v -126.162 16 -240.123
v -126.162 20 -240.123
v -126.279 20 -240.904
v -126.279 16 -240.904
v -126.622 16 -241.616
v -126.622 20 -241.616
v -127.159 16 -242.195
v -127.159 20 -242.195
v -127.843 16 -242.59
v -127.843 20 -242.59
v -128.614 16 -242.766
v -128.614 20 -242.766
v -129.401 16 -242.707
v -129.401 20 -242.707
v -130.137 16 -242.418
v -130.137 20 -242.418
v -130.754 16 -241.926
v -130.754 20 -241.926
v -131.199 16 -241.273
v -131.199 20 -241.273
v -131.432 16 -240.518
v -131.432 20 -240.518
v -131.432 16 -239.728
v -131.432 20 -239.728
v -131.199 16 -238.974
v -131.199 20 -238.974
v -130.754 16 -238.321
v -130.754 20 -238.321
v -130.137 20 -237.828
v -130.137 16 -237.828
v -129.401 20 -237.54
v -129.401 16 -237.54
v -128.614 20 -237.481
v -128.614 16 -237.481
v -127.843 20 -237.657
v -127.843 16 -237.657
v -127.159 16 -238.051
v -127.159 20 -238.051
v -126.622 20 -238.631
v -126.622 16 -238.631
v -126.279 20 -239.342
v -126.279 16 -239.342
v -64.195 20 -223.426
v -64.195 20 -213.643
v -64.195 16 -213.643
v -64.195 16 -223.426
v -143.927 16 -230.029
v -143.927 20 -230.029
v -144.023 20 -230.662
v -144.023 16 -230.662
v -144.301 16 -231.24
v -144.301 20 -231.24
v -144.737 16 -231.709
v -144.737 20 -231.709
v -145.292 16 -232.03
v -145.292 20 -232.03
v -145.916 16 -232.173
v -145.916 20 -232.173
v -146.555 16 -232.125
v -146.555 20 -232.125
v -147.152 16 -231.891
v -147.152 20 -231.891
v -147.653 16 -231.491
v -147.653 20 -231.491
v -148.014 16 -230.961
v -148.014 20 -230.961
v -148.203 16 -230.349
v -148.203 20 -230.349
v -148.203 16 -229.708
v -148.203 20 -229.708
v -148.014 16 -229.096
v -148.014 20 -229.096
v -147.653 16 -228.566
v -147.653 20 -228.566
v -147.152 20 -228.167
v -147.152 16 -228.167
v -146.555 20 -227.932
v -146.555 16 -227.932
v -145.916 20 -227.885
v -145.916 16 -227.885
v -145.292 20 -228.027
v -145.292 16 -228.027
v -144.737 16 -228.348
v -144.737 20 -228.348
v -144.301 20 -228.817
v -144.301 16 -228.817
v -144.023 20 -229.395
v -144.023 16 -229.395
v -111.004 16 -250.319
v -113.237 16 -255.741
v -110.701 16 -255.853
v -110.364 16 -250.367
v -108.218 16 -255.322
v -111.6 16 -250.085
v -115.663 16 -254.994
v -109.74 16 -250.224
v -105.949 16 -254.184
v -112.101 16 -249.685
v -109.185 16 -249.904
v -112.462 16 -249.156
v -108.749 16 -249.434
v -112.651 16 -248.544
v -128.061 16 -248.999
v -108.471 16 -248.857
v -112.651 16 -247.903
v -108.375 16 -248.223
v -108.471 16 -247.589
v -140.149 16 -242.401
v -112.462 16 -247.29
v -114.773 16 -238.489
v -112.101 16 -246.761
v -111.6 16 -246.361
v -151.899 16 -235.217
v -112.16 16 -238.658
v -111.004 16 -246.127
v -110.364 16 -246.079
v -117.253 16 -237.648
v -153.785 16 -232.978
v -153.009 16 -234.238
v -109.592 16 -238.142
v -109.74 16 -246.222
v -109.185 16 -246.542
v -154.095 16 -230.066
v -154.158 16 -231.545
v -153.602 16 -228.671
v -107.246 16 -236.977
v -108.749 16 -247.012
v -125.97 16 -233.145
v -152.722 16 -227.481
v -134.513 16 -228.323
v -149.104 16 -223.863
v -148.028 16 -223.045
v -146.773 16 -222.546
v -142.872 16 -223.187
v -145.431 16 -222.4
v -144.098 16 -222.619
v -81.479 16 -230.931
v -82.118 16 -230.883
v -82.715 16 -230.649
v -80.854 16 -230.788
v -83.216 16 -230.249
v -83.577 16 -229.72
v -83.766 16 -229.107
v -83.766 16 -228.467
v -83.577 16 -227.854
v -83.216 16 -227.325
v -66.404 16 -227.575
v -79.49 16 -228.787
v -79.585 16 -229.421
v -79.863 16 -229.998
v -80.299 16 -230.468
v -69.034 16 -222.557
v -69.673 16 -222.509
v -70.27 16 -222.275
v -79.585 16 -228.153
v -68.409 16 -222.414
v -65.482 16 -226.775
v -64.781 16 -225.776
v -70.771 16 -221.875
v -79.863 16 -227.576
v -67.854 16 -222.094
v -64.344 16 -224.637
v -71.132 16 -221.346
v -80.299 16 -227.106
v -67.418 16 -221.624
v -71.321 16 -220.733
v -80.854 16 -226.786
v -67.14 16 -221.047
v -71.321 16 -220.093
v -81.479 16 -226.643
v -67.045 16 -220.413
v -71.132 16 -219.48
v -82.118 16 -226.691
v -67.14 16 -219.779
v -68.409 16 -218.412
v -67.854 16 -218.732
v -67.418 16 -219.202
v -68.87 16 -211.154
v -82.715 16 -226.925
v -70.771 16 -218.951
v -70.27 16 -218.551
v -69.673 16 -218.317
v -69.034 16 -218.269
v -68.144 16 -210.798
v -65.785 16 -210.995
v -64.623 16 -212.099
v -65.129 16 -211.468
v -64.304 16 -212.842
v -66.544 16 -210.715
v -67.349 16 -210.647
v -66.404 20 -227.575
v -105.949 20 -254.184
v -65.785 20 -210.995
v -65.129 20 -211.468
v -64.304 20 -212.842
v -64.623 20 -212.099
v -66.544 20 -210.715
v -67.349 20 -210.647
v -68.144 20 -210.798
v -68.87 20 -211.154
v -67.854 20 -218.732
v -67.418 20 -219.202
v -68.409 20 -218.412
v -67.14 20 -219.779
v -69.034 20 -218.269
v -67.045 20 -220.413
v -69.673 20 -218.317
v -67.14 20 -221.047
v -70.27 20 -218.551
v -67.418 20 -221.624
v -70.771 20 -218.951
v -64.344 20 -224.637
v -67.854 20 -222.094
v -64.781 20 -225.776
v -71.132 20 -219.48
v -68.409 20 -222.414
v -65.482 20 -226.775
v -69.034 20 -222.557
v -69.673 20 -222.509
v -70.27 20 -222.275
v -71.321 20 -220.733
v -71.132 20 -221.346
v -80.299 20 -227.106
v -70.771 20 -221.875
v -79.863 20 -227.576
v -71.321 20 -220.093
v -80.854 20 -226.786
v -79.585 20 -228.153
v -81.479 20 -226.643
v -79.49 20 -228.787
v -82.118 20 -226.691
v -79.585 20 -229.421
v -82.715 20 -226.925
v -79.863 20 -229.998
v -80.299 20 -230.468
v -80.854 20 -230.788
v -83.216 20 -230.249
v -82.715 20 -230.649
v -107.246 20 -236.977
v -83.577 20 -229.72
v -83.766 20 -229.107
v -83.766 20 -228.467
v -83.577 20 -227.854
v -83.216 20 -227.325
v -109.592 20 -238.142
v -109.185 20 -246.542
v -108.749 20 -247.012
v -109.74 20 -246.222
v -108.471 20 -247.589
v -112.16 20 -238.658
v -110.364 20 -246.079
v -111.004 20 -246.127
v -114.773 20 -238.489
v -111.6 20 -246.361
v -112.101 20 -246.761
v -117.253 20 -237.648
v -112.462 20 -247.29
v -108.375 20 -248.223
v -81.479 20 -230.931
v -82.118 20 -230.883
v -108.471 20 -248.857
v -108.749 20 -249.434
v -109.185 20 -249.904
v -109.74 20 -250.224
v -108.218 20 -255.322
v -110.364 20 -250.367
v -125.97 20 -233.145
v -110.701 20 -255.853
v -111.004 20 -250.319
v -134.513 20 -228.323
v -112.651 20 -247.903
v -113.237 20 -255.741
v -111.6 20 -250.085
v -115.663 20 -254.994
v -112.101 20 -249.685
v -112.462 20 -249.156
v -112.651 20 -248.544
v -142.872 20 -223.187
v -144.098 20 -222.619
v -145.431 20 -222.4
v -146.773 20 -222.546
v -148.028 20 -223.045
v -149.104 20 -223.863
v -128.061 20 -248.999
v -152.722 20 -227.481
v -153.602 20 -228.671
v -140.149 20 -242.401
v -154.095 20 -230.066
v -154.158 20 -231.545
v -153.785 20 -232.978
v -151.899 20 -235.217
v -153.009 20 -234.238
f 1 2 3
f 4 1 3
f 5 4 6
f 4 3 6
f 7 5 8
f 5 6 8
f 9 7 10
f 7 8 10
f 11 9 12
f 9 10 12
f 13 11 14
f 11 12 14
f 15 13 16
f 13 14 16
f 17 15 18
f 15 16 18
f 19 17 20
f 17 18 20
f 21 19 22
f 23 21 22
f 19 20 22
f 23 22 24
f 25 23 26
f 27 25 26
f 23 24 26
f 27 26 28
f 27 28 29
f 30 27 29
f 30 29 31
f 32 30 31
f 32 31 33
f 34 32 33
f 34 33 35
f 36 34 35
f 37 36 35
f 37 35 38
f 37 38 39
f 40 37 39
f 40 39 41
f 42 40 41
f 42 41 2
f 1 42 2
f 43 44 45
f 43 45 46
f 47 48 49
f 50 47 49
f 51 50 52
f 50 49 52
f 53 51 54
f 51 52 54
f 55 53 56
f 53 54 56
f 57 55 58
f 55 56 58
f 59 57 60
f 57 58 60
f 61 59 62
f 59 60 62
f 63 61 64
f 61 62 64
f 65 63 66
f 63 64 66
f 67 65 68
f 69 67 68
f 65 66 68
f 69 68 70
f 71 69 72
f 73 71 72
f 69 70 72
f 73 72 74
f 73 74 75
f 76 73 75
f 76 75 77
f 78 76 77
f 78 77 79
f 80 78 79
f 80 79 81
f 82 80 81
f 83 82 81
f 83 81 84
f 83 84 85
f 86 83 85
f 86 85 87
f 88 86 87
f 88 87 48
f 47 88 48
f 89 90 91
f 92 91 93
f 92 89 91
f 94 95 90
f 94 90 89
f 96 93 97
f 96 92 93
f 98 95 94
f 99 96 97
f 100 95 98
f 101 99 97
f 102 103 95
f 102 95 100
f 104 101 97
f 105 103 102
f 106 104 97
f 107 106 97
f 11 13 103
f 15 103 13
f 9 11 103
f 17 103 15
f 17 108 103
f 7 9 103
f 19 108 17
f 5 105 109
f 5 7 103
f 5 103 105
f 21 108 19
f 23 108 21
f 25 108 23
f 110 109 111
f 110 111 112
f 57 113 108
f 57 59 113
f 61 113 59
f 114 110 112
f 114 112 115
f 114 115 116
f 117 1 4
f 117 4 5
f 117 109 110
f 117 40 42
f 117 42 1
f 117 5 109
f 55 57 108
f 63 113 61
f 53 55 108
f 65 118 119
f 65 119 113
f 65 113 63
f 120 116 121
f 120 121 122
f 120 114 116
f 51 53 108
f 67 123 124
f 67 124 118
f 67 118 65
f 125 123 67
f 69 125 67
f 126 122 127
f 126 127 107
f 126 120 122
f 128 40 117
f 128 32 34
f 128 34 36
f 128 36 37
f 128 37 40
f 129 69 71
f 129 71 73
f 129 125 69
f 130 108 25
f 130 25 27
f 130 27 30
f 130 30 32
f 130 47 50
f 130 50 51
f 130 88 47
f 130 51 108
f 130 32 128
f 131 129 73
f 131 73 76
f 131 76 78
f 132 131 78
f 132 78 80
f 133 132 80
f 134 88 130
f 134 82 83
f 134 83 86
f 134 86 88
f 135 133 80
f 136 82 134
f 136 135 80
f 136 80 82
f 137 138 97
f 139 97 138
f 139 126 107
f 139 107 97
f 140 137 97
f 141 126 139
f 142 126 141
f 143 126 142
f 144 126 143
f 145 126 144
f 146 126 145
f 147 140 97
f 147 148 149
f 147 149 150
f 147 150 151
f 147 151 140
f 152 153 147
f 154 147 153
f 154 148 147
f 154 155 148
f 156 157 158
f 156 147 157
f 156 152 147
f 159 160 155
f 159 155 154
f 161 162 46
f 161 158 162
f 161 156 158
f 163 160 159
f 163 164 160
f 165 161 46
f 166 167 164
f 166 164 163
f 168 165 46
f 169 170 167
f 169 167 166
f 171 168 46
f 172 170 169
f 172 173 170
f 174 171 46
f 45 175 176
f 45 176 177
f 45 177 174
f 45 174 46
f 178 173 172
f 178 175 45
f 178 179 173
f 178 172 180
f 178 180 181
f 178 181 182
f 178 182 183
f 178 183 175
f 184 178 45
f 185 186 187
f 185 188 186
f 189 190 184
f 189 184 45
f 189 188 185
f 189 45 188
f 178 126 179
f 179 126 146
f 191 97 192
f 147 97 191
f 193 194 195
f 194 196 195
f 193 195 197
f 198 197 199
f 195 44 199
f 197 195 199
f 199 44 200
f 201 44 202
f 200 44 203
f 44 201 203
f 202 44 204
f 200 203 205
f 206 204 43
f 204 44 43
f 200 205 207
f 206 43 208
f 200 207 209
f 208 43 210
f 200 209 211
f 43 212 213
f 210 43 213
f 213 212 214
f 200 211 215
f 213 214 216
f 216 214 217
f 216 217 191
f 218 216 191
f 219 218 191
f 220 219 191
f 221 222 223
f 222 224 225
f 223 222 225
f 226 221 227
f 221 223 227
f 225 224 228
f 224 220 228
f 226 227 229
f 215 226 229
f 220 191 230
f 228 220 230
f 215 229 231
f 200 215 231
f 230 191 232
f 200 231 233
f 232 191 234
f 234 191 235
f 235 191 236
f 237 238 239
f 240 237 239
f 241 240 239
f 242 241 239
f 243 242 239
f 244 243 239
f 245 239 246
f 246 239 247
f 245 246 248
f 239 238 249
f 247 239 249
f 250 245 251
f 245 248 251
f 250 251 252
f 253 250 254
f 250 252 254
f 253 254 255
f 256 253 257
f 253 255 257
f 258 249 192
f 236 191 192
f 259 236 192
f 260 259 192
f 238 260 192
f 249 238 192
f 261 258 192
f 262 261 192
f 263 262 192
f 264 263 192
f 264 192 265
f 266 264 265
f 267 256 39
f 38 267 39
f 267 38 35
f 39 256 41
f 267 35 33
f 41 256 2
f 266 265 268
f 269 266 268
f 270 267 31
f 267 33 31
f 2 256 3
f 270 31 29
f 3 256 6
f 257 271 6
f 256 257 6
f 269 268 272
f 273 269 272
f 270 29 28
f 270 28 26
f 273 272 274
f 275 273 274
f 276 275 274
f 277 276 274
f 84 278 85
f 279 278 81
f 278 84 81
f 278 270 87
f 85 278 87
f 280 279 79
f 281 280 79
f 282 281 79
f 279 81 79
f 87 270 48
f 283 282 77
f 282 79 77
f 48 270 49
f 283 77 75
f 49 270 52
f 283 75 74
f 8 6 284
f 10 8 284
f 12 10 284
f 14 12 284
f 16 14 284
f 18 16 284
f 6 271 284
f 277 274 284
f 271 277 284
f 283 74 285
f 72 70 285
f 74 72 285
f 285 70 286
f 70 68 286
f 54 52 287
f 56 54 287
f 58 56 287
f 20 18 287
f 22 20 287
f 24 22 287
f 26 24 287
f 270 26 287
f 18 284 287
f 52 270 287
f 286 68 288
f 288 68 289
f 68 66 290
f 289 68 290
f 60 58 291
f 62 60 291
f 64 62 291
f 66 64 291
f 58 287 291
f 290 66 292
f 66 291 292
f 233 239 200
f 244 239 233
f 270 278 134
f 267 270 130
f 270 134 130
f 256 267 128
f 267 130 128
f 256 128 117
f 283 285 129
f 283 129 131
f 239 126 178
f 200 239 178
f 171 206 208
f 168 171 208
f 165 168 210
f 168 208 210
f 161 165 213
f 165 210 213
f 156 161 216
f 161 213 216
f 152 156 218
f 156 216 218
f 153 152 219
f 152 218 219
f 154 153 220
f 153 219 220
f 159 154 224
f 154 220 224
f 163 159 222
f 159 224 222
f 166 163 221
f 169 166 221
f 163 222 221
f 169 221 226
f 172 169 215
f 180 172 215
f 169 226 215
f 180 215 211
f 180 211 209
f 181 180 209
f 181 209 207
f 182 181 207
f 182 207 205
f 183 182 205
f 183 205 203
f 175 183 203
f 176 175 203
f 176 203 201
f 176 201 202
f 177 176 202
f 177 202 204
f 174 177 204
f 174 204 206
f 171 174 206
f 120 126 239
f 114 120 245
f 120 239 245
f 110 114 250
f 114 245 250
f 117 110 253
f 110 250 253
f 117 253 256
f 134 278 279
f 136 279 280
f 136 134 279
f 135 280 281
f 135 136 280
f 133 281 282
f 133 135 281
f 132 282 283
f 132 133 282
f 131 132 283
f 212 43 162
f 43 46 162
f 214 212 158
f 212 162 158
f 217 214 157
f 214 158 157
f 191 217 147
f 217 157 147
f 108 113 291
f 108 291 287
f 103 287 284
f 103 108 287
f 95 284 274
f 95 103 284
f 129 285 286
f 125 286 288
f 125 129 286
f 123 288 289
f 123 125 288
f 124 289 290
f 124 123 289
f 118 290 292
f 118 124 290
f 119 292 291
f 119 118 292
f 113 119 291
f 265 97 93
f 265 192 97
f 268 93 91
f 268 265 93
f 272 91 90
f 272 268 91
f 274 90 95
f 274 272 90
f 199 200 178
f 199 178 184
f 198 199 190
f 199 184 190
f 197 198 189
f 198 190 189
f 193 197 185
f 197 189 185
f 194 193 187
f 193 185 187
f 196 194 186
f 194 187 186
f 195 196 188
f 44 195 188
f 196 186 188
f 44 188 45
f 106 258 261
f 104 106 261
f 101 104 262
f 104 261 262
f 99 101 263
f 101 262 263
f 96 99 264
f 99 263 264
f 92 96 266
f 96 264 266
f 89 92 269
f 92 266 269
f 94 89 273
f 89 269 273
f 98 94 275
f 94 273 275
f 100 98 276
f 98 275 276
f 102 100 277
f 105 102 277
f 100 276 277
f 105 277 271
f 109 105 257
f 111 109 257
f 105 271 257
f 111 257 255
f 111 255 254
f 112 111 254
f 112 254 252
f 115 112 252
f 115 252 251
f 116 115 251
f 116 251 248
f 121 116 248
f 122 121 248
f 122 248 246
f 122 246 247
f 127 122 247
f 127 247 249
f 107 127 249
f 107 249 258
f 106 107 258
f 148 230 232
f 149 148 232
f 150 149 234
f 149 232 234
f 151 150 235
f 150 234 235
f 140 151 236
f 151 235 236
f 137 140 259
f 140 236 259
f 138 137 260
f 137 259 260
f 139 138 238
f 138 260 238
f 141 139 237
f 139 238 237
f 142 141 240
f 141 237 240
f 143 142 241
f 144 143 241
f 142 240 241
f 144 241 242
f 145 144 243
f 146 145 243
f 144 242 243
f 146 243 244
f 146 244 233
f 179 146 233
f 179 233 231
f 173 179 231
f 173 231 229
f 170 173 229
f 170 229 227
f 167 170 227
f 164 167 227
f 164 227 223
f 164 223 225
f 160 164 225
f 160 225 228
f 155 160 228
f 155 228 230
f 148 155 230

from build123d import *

# Parameters (mm, degrees)
SKETCH_1_R               = 275
SKETCH_1_R_2             = 255
EXTRUDE_1_DEPTH          = 10
EXTRUDE_2_DEPTH          = 10
SKETCH_8_R               = 2.65
SKETCH_8_R_2             = 2.15
CUT_EXTRUDE_1_DEPTH      = 21
SKETCH_9_OUTSIDE_W       = 707.614
SKETCH_9_OUTSIDE_H       = 707.614
CUT_EXTRUDE_2_DEPTH      = 21
SKETCH_10_W              = 190.987823936
SKETCH_10_H              = 12
CUT_EXTRUDE_3_DEPTH      = 519.420037555
CUT_EXTRUDE_3_DEPTH_BACK = 245.939436413
FILLET_1_R               = 3
FILLET_2_R               = 10
FILLET_3_R               = 5
SKETCH_11_W              = 751.740061758
SKETCH_11_H              = 25.075171634
CUT_EXTRUDE_4_DEPTH      = 519.420037555
CUT_EXTRUDE_4_DEPTH_BACK = 245.939436413


with BuildPart() as part:
    # 草图1 → 凸台-拉伸1 (new body)
    with BuildSketch(Plane(origin=(0, 0, 0), x_dir=(1, 0, 0), z_dir=(0, 1, 0))):
        Circle(SKETCH_1_R)
        Circle(SKETCH_1_R_2, mode=Mode.SUBTRACT)
    extrude(amount=EXTRUDE_1_DEPTH)

    # 草图11 → 切除-拉伸4 (cut, two sides)
    with BuildSketch(Plane(origin=(76.33674701, 0, -113.448714652), x_dir=(0.829665535, 0, 0.558260781), z_dir=(-0.558260781, 0, 0.829665535))) as cut_extrude_4_sk:
        with Locations((71.776229786, 3.462414183)):
            Rectangle(SKETCH_11_W, SKETCH_11_H)
    extrude(amount=CUT_EXTRUDE_4_DEPTH, mode=Mode.SUBTRACT)
    extrude(cut_extrude_4_sk.sketch, amount=-CUT_EXTRUDE_4_DEPTH_BACK, mode=Mode.SUBTRACT)


with BuildPart() as body_2:
    # 草图2 → 凸台-拉伸2 (new body)
    with BuildSketch(Plane(origin=(0, 10, 0), x_dir=(1, 0, 0), z_dir=(0, 1, 0))):
        with BuildLine():
            Line((-110.525139894, 257.262887824), (-25.423255477, 200))
            Line((-25.423255477, 200), (0, 200))
            Line((0, 200), (25.423255477, 200))
            Line((25.423255477, 200), (110.525139894, 257.262887824))
            ThreePointArc((110.525139894, 257.262887824), (197.989898732, 197.989898732), (257.262887824, 110.525139894))
            Line((257.262887824, 110.525139894), (200, 25.423255477))
            Line((200, 25.423255477), (200, 0))
            Line((200, 0), (200, -25.423255477))
            Line((200, -25.423255477), (257.262887824, -110.525139894))
            ThreePointArc((257.262887824, -110.525139894), (197.989898732, -197.989898732), (110.525139894, -257.262887824))
            Line((110.525139894, -257.262887824), (25.423255477, -200))
            Line((25.423255477, -200), (0, -200))
            Line((0, -200), (-25.423255477, -200))
            Line((-25.423255477, -200), (-110.525139894, -257.262887824))
            ThreePointArc((-110.525139894, -257.262887824), (-197.989898732, -197.989898732), (-257.262887824, -110.525139894))
            Line((-257.262887824, -110.525139894), (-200, -25.423255477))
            Line((-200, -25.423255477), (-200, 25.423255477))
            Line((-200, 25.423255477), (-257.262887824, 110.525139894))
            ThreePointArc((-257.262887824, 110.525139894), (-197.989898732, 197.989898732), (-110.525139894, 257.262887824))
        make_face()
        with BuildLine():
            Line((0, 185), (30, 185))
            Line((30, 185), (111.993839361, 240.171563565))
            ThreePointArc((111.993839361, 240.171563565), (187.383297014, 187.383297014), (240.171563565, 111.993839361))
            Line((240.171563565, 111.993839361), (185, 30))
            Line((185, 30), (185, 0))
            Line((185, 0), (185, -30))
            Line((185, -30), (240.171563565, -111.993839361))
            ThreePointArc((240.171563565, -111.993839361), (187.383297014, -187.383297014), (111.993839361, -240.171563565))
            Line((111.993839361, -240.171563565), (30, -185))
            Line((30, -185), (0, -185))
            Line((0, -185), (-30, -185))
            Line((-30, -185), (-111.993839361, -240.171563565))
            ThreePointArc((-111.993839361, -240.171563565), (-187.383297014, -187.383297014), (-240.171563565, -111.993839361))
            Line((-240.171563565, -111.993839361), (-185, -30))
            Line((-185, -30), (-185, 30))
            Line((-185, 30), (-240.171563565, 111.993839361))
            ThreePointArc((-240.171563565, 111.993839361), (-187.383297014, 187.383297014), (-111.993839361, 240.171563565))
            Line((-111.993839361, 240.171563565), (-30, 185))
            Line((-30, 185), (0, 185))
        make_face(mode=Mode.SUBTRACT)
    extrude(amount=EXTRUDE_2_DEPTH)

    # 草图8 → 切除-拉伸1 (cut, through all)
    with BuildSketch(Plane(origin=(0, 20, 0), x_dir=(1, 0, 0), z_dir=(0, 1, 0))):
        with Locations((-10, 192.5)):
            Circle(SKETCH_8_R)
        with Locations((10, 192.5)):
            Circle(SKETCH_8_R)
        with Locations((-10, -192.5)):
            Circle(SKETCH_8_R)
        with Locations((10, -192.5)):
            Circle(SKETCH_8_R)
        with Locations((192.5, 10)):
            Circle(SKETCH_8_R)
        with Locations((192.5, -10)):
            Circle(SKETCH_8_R)
        with Locations((-192.5, 10)):
            Circle(SKETCH_8_R)
        with Locations((-192.5, -10)):
            Circle(SKETCH_8_R)
        with Locations((-110.525139894, 248.223100485)):
            Circle(SKETCH_8_R_2)
        with Locations((-27.711627738, 192.5)):
            Circle(SKETCH_8_R_2)
        with Locations((-44.304938442, 203.665215623)):
            Circle(SKETCH_8_R_2)
        with Locations((-56.749921469, 212.03912734)):
            Circle(SKETCH_8_R_2)
        with Locations((-69.194904497, 220.413039057)):
            Circle(SKETCH_8_R_2)
        with Locations((-81.639887524, 228.786950774)):
            Circle(SKETCH_8_R_2)
        with Locations((-146.077022117, 230.028561882)):
            Circle(SKETCH_8_R_2)
        with Locations((-164.415519771, 217.299729706)):
            Circle(SKETCH_8_R_2)
        with Locations((-183.638937552, 201.316607082)):
            Circle(SKETCH_8_R_2)
        with Locations((-201.316607082, 183.638937552)):
            Circle(SKETCH_8_R_2)
        with Locations((-217.299729706, 164.415519771)):
            Circle(SKETCH_8_R_2)
        with Locations((-230.028561882, 146.077022117)):
            Circle(SKETCH_8_R_2)
        with Locations((-128.811575358, 240.123330241)):
            Circle(SKETCH_8_R)
        with Locations((-240.123330241, 128.811575358)):
            Circle(SKETCH_8_R)
        with Locations((-228.786950774, 81.639887524)):
            Circle(SKETCH_8_R_2)
        with Locations((-220.413039057, 69.194904497)):
            Circle(SKETCH_8_R_2)
        with Locations((-212.03912734, 56.749921469)):
            Circle(SKETCH_8_R_2)
        with Locations((-203.665215623, 44.304938442)):
            Circle(SKETCH_8_R_2)
        with Locations((-192.5, 27.711627738)):
            Circle(SKETCH_8_R_2)
        with Locations((-248.223100485, 110.525139894)):
            Circle(SKETCH_8_R_2)
        with Locations((192.5, 27.711627738)):
            Circle(SKETCH_8_R_2)
        with Locations((248.223100485, 110.525139894)):
            Circle(SKETCH_8_R_2)
        with Locations((203.665215623, 44.304938442)):
            Circle(SKETCH_8_R_2)
        with Locations((212.03912734, 56.749921469)):
            Circle(SKETCH_8_R_2)
        with Locations((220.413039057, 69.194904497)):
            Circle(SKETCH_8_R_2)
        with Locations((228.786950774, 81.639887524)):
            Circle(SKETCH_8_R_2)
        with Locations((240.123330241, 128.811575358)):
            Circle(SKETCH_8_R)
        with Locations((230.028561882, 146.077022117)):
            Circle(SKETCH_8_R_2)
        with Locations((128.811575358, 240.123330241)):
            Circle(SKETCH_8_R)
        with Locations((201.316607082, 183.638937552)):
            Circle(SKETCH_8_R_2)
        with Locations((183.638937552, 201.316607082)):
            Circle(SKETCH_8_R_2)
        with Locations((164.415519771, 217.299729706)):
            Circle(SKETCH_8_R_2)
        with Locations((146.077022117, 230.028561882)):
            Circle(SKETCH_8_R_2)
        with Locations((81.639887524, 228.786950774)):
            Circle(SKETCH_8_R_2)
        with Locations((69.194904497, 220.413039057)):
            Circle(SKETCH_8_R_2)
        with Locations((56.749921469, 212.03912734)):
            Circle(SKETCH_8_R_2)
        with Locations((44.304938442, 203.665215623)):
            Circle(SKETCH_8_R_2)
        with Locations((110.525139894, 248.223100485)):
            Circle(SKETCH_8_R_2)
        with Locations((27.711627738, 192.5)):
            Circle(SKETCH_8_R_2)
        with Locations((217.299729706, 164.415519771)):
            Circle(SKETCH_8_R_2)
    extrude(amount=-CUT_EXTRUDE_1_DEPTH, mode=Mode.SUBTRACT)

    # 草图9 outside → 切除-拉伸2 (cut, through all)
    with BuildSketch(Plane(origin=(0, 20, 0), x_dir=(1, 0, 0), z_dir=(0, 1, 0))):
        Rectangle(SKETCH_9_OUTSIDE_W, SKETCH_9_OUTSIDE_H)
        with BuildLine():
            Line((-157.049761777, 231.808913387), (-146.237600169, 220.996751779))
            ThreePointArc((-146.237600169, 220.996751779), (-129.47118383, 231.218971016), (-111.993839361, 240.171563565))
            Line((-111.993839361, 240.171563565), (-64.194904497, 208.008879225))
            Line((-64.194904497, 208.008879225), (-64.194904497, 226.088453902))
            Line((-64.194904497, 226.088453902), (-110.525139894, 257.262887824))
            ThreePointArc((-110.525139894, 257.262887824), (-134.391436501, 245.639861983), (-157.049761777, 231.808913387))
        make_face(mode=Mode.SUBTRACT)
    extrude(amount=-CUT_EXTRUDE_2_DEPTH, mode=Mode.SUBTRACT)

    # 草图10 → 切除-拉伸3 (cut, two sides)
    with BuildSketch(Plane(origin=(76.33674701, 0, -113.448714652), x_dir=(0.829665535, 0, 0.558260781), z_dir=(-0.558260781, 0, 0.829665535))) as cut_extrude_3_sk:
        with Locations((-226.995793353, 10)):
            Rectangle(SKETCH_10_W, SKETCH_10_H)
    extrude(amount=CUT_EXTRUDE_3_DEPTH, mode=Mode.SUBTRACT)
    extrude(cut_extrude_3_sk.sketch, amount=-CUT_EXTRUDE_3_DEPTH_BACK, mode=Mode.SUBTRACT)

    # 圆角1
    fillet_1_edges = [body_2.edges().sort_by_distance(p)[0] for p in [
        (-64.194904497, 18, -208.008879225),
    ]]
    fillet(fillet_1_edges, radius=FILLET_1_R)

    # 圆角2
    fillet_2_edges = [body_2.edges().sort_by_distance(p)[0] for p in [
        (-110.525139894, 18, -257.262887824),
        (-111.993839361, 18, -240.171563565),
    ]]
    fillet(fillet_2_edges, radius=FILLET_2_R)

    # 圆角3
    fillet_3_edges = [body_2.edges().sort_by_distance(p)[0] for p in [
        (-146.237600169, 18, -220.996751779),
        (-64.194904497, 18, -226.088453902),
        (-157.049761777, 18, -231.808913387),
    ]]
    fillet(fillet_3_edges, radius=FILLET_3_R)


solid = body_2.part
